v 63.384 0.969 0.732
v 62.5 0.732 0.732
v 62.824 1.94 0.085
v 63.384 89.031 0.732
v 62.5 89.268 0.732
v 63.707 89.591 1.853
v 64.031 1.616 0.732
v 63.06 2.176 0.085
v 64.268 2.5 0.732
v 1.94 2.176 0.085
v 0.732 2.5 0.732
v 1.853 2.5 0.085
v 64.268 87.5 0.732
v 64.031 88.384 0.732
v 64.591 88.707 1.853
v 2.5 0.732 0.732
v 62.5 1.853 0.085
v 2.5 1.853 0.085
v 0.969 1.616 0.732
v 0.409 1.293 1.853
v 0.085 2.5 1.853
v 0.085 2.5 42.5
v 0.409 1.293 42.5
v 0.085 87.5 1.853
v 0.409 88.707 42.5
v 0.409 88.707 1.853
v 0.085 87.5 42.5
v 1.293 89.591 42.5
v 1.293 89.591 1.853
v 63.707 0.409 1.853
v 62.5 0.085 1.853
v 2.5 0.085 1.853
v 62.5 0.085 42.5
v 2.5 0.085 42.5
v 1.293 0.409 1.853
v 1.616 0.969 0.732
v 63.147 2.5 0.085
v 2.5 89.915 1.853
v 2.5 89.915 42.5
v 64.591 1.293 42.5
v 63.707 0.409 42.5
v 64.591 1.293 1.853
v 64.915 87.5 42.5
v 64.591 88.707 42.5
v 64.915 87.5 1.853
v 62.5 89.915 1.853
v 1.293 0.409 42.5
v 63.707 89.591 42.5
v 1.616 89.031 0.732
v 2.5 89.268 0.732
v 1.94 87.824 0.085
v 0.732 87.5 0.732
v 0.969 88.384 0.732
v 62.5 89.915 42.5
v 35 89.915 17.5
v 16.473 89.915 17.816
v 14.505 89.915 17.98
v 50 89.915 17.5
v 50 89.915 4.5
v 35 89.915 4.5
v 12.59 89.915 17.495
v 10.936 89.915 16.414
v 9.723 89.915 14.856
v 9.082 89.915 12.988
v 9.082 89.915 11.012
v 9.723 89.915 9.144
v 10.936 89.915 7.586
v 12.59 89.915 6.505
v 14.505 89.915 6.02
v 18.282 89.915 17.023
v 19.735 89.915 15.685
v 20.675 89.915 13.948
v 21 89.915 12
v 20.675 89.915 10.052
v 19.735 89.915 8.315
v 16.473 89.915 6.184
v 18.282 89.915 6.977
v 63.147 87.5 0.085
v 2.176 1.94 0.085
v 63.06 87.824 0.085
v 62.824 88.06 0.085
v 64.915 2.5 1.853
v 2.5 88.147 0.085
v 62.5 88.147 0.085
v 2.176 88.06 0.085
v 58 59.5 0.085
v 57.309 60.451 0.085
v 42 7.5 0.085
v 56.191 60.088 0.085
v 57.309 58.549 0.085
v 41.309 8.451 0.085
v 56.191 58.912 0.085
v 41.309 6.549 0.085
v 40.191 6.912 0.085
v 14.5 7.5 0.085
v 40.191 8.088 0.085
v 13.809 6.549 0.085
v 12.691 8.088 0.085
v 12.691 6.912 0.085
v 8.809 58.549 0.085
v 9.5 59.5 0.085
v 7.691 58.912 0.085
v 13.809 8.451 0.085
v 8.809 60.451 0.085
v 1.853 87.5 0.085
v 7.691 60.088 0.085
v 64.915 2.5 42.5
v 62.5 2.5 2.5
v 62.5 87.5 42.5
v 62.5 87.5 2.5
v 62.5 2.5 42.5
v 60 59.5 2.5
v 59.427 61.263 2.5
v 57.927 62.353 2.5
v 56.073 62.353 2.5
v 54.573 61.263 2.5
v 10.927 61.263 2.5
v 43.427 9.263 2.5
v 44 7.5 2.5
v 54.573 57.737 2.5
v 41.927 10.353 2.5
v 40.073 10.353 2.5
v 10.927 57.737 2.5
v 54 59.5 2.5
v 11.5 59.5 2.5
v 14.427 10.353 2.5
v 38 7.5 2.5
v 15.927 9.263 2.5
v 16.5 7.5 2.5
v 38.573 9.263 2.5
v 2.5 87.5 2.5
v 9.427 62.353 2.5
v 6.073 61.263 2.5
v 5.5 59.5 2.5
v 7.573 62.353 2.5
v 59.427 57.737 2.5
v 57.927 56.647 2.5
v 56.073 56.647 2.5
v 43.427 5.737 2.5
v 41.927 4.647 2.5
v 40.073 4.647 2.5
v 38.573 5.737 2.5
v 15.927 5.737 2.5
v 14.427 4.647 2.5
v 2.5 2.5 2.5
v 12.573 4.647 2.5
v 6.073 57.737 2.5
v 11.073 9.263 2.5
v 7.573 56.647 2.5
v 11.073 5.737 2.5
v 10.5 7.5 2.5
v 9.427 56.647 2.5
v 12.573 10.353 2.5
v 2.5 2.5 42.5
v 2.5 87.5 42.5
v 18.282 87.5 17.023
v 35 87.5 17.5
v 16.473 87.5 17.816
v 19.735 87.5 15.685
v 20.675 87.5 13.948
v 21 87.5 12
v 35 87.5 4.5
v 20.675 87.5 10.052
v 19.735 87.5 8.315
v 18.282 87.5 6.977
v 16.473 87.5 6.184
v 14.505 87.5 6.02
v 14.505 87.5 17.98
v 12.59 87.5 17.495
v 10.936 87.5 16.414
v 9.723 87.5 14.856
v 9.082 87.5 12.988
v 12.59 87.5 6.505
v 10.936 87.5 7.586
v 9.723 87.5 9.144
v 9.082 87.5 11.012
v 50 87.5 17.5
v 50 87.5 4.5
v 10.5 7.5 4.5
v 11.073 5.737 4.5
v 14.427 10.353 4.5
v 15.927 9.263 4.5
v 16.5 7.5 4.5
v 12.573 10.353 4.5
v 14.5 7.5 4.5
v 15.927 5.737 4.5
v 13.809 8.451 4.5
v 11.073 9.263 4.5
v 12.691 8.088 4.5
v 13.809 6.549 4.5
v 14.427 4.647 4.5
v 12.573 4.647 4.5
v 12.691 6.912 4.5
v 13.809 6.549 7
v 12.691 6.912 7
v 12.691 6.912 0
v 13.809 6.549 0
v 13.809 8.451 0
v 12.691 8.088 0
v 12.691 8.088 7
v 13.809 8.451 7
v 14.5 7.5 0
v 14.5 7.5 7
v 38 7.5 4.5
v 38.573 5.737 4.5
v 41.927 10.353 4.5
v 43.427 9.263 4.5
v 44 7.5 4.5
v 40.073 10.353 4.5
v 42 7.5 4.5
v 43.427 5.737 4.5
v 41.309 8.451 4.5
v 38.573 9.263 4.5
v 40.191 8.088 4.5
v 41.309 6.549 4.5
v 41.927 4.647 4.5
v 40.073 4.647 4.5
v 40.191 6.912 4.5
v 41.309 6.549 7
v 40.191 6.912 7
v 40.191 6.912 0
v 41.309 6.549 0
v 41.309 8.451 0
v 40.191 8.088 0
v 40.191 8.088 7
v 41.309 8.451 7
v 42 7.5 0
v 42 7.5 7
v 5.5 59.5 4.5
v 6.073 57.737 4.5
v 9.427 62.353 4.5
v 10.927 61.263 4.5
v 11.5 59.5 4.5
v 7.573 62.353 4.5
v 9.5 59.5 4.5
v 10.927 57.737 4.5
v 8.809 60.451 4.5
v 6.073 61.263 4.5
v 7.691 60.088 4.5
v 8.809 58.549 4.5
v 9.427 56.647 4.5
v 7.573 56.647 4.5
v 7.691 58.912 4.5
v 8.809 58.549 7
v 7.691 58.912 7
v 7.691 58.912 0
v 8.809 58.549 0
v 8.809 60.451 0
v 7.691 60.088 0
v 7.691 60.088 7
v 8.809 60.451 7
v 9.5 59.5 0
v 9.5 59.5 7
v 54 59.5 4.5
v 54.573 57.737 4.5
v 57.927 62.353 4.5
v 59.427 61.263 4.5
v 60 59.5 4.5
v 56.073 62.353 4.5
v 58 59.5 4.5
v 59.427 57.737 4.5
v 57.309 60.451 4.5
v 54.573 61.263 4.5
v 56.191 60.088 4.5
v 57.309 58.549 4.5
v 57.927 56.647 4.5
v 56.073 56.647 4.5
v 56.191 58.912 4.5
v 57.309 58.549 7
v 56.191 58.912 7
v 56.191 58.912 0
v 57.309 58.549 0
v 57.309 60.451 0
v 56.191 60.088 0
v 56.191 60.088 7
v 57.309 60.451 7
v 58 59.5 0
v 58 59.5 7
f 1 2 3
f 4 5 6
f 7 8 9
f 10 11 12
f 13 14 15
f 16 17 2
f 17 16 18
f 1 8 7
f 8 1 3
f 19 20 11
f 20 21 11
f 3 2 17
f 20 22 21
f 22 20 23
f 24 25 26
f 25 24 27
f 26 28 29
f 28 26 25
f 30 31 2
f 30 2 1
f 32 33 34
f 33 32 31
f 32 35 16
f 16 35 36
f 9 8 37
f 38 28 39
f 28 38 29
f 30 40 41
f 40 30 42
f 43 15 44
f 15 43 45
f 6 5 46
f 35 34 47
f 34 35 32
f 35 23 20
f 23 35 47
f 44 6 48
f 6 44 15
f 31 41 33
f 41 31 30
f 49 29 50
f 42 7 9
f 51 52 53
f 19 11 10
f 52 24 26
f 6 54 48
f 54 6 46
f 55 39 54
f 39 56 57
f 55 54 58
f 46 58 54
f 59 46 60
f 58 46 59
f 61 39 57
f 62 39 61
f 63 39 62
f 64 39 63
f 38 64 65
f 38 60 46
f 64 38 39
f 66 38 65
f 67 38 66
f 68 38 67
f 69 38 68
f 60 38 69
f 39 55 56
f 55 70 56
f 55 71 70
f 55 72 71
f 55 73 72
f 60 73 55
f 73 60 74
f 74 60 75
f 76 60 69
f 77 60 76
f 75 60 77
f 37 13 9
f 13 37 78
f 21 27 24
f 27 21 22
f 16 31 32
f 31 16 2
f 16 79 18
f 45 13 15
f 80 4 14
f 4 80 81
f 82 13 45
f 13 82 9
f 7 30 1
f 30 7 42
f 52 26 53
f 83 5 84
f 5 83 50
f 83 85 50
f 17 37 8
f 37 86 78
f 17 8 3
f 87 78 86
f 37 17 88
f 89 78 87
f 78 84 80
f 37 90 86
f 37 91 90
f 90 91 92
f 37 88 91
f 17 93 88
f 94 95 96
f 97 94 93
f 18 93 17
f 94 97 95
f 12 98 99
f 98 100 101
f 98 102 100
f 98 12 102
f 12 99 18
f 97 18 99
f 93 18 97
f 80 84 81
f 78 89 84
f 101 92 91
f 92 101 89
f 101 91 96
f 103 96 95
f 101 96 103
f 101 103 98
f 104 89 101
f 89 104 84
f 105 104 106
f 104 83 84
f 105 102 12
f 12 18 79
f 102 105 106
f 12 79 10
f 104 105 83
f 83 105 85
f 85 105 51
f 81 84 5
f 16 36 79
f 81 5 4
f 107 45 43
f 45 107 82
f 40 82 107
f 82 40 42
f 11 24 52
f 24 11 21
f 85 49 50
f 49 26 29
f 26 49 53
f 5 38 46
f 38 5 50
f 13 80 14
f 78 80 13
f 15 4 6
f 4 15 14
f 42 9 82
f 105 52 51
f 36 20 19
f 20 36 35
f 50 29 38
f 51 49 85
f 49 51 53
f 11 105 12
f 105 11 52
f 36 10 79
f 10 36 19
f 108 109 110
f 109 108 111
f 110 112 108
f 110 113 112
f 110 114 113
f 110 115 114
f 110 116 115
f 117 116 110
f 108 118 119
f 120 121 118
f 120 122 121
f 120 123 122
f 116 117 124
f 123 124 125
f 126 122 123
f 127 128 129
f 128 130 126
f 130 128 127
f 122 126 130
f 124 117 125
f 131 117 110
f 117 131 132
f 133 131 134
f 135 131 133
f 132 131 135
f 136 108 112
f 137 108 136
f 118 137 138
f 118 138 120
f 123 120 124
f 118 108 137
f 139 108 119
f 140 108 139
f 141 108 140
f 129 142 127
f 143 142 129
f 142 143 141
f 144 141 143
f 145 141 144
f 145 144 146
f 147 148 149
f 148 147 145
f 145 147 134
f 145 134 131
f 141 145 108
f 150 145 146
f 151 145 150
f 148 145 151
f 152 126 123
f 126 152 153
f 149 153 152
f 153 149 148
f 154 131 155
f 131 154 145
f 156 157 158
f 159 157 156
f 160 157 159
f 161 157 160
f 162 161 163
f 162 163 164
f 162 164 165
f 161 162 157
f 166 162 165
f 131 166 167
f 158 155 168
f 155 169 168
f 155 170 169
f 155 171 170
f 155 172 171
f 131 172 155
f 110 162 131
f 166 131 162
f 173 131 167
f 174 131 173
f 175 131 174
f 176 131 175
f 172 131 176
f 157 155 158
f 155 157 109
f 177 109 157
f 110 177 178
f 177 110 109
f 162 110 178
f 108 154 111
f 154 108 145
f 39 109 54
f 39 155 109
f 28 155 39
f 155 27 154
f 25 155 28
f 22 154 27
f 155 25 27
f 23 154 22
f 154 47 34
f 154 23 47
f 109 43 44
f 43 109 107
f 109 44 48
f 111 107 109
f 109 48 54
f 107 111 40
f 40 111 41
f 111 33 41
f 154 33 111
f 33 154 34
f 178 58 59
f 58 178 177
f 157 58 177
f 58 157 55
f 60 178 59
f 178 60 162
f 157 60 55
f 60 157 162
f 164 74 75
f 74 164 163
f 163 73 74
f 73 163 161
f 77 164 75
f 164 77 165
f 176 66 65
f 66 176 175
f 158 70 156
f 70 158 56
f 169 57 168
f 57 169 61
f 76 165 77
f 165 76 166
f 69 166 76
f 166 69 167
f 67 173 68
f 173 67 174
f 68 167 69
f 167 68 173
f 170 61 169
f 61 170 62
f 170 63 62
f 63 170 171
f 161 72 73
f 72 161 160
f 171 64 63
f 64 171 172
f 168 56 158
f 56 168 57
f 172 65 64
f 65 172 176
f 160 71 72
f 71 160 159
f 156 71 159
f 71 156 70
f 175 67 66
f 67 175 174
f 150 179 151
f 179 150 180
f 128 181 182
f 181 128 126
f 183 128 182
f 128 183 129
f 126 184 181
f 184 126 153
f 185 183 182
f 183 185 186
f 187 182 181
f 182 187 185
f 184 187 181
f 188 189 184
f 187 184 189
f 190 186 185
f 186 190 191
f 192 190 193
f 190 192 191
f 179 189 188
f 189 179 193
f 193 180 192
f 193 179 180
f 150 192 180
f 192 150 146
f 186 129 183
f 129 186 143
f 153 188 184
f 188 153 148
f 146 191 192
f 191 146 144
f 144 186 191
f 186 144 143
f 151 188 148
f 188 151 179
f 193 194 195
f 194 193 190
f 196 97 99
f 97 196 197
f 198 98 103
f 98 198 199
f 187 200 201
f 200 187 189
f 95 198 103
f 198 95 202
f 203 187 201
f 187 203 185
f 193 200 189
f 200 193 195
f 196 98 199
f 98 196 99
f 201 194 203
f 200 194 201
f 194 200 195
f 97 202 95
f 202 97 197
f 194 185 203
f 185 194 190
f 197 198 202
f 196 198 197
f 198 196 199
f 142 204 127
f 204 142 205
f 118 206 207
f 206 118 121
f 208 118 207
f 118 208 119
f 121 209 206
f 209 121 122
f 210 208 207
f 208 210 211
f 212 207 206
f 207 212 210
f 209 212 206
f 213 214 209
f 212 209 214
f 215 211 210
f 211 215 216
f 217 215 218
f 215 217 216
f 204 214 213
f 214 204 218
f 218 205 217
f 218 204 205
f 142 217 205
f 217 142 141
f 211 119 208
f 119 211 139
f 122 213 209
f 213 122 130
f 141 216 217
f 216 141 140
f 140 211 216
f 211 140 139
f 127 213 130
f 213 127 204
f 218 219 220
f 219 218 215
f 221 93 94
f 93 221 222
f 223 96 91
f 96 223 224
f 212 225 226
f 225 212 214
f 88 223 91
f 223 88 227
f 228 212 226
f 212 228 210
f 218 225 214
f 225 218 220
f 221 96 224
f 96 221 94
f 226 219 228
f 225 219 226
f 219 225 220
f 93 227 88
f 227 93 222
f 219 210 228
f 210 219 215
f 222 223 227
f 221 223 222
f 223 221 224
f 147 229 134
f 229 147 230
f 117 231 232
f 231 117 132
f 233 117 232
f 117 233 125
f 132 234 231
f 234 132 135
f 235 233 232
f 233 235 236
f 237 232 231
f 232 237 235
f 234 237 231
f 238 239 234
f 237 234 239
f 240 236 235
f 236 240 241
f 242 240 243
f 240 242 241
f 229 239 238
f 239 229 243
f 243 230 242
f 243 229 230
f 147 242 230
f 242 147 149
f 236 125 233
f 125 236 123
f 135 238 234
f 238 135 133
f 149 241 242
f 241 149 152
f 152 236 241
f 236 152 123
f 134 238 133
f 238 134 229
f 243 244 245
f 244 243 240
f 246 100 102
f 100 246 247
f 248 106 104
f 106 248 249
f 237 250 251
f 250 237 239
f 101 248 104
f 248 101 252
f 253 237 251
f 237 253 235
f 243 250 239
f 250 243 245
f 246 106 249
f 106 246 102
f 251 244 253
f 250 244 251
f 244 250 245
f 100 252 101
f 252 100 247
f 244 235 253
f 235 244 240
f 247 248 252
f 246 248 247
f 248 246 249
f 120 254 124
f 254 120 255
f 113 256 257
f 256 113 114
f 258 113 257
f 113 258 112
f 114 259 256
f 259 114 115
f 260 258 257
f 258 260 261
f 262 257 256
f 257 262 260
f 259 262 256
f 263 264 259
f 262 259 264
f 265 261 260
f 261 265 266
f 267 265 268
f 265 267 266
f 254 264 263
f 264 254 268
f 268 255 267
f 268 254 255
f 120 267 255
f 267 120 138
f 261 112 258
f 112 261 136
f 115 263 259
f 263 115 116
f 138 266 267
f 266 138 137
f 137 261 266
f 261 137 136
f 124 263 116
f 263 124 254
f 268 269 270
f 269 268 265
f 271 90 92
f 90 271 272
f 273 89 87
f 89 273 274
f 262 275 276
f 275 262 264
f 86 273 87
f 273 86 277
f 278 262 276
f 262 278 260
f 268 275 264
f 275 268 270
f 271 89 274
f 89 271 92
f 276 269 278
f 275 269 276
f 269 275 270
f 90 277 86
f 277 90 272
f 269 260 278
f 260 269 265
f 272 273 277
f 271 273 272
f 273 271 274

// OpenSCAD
module cbox(x,y,z,c){       //curved box template
    minkowski(){
cube([x-2*c,y-2*c,z-2*c]);
    translate([c,c,c])
    sphere(r=c,$fn=12);
}
}

module pillar(){                //standoff pillar template
translate([0,0,0.5])
    cylinder(r=3,h=4);
    translate([0,0,1]);
    cylinder(r=1,h=7);
}

difference(){                   //hollow box
cbox(65,90,50,2.5);
translate([2.5,2.5,2.5])            //hollow interior
    cube([60,85,50]);

translate([-5,-5,42.5])             //flat top
    cube([120,120,100]);

translate([35,80,4.5])      //square cutout for USB
  cube([15,20,13]);
//translate([42.5,80,11])     //round cutout for USB
  //  rotate([270,0,0])
    //cylinder(r=8,h=20);

translate([15,80,12])     //round cutout for dc jack
    rotate([270,0,0])
    cylinder(r=6,h=20);

}

translate([13.5,7.5,0])           //pillars
pillar();
translate([41,7.5,0])
pillar();
translate([8.5,59.5,0])
pillar();
translate([57,59.5,0])
pillar();
